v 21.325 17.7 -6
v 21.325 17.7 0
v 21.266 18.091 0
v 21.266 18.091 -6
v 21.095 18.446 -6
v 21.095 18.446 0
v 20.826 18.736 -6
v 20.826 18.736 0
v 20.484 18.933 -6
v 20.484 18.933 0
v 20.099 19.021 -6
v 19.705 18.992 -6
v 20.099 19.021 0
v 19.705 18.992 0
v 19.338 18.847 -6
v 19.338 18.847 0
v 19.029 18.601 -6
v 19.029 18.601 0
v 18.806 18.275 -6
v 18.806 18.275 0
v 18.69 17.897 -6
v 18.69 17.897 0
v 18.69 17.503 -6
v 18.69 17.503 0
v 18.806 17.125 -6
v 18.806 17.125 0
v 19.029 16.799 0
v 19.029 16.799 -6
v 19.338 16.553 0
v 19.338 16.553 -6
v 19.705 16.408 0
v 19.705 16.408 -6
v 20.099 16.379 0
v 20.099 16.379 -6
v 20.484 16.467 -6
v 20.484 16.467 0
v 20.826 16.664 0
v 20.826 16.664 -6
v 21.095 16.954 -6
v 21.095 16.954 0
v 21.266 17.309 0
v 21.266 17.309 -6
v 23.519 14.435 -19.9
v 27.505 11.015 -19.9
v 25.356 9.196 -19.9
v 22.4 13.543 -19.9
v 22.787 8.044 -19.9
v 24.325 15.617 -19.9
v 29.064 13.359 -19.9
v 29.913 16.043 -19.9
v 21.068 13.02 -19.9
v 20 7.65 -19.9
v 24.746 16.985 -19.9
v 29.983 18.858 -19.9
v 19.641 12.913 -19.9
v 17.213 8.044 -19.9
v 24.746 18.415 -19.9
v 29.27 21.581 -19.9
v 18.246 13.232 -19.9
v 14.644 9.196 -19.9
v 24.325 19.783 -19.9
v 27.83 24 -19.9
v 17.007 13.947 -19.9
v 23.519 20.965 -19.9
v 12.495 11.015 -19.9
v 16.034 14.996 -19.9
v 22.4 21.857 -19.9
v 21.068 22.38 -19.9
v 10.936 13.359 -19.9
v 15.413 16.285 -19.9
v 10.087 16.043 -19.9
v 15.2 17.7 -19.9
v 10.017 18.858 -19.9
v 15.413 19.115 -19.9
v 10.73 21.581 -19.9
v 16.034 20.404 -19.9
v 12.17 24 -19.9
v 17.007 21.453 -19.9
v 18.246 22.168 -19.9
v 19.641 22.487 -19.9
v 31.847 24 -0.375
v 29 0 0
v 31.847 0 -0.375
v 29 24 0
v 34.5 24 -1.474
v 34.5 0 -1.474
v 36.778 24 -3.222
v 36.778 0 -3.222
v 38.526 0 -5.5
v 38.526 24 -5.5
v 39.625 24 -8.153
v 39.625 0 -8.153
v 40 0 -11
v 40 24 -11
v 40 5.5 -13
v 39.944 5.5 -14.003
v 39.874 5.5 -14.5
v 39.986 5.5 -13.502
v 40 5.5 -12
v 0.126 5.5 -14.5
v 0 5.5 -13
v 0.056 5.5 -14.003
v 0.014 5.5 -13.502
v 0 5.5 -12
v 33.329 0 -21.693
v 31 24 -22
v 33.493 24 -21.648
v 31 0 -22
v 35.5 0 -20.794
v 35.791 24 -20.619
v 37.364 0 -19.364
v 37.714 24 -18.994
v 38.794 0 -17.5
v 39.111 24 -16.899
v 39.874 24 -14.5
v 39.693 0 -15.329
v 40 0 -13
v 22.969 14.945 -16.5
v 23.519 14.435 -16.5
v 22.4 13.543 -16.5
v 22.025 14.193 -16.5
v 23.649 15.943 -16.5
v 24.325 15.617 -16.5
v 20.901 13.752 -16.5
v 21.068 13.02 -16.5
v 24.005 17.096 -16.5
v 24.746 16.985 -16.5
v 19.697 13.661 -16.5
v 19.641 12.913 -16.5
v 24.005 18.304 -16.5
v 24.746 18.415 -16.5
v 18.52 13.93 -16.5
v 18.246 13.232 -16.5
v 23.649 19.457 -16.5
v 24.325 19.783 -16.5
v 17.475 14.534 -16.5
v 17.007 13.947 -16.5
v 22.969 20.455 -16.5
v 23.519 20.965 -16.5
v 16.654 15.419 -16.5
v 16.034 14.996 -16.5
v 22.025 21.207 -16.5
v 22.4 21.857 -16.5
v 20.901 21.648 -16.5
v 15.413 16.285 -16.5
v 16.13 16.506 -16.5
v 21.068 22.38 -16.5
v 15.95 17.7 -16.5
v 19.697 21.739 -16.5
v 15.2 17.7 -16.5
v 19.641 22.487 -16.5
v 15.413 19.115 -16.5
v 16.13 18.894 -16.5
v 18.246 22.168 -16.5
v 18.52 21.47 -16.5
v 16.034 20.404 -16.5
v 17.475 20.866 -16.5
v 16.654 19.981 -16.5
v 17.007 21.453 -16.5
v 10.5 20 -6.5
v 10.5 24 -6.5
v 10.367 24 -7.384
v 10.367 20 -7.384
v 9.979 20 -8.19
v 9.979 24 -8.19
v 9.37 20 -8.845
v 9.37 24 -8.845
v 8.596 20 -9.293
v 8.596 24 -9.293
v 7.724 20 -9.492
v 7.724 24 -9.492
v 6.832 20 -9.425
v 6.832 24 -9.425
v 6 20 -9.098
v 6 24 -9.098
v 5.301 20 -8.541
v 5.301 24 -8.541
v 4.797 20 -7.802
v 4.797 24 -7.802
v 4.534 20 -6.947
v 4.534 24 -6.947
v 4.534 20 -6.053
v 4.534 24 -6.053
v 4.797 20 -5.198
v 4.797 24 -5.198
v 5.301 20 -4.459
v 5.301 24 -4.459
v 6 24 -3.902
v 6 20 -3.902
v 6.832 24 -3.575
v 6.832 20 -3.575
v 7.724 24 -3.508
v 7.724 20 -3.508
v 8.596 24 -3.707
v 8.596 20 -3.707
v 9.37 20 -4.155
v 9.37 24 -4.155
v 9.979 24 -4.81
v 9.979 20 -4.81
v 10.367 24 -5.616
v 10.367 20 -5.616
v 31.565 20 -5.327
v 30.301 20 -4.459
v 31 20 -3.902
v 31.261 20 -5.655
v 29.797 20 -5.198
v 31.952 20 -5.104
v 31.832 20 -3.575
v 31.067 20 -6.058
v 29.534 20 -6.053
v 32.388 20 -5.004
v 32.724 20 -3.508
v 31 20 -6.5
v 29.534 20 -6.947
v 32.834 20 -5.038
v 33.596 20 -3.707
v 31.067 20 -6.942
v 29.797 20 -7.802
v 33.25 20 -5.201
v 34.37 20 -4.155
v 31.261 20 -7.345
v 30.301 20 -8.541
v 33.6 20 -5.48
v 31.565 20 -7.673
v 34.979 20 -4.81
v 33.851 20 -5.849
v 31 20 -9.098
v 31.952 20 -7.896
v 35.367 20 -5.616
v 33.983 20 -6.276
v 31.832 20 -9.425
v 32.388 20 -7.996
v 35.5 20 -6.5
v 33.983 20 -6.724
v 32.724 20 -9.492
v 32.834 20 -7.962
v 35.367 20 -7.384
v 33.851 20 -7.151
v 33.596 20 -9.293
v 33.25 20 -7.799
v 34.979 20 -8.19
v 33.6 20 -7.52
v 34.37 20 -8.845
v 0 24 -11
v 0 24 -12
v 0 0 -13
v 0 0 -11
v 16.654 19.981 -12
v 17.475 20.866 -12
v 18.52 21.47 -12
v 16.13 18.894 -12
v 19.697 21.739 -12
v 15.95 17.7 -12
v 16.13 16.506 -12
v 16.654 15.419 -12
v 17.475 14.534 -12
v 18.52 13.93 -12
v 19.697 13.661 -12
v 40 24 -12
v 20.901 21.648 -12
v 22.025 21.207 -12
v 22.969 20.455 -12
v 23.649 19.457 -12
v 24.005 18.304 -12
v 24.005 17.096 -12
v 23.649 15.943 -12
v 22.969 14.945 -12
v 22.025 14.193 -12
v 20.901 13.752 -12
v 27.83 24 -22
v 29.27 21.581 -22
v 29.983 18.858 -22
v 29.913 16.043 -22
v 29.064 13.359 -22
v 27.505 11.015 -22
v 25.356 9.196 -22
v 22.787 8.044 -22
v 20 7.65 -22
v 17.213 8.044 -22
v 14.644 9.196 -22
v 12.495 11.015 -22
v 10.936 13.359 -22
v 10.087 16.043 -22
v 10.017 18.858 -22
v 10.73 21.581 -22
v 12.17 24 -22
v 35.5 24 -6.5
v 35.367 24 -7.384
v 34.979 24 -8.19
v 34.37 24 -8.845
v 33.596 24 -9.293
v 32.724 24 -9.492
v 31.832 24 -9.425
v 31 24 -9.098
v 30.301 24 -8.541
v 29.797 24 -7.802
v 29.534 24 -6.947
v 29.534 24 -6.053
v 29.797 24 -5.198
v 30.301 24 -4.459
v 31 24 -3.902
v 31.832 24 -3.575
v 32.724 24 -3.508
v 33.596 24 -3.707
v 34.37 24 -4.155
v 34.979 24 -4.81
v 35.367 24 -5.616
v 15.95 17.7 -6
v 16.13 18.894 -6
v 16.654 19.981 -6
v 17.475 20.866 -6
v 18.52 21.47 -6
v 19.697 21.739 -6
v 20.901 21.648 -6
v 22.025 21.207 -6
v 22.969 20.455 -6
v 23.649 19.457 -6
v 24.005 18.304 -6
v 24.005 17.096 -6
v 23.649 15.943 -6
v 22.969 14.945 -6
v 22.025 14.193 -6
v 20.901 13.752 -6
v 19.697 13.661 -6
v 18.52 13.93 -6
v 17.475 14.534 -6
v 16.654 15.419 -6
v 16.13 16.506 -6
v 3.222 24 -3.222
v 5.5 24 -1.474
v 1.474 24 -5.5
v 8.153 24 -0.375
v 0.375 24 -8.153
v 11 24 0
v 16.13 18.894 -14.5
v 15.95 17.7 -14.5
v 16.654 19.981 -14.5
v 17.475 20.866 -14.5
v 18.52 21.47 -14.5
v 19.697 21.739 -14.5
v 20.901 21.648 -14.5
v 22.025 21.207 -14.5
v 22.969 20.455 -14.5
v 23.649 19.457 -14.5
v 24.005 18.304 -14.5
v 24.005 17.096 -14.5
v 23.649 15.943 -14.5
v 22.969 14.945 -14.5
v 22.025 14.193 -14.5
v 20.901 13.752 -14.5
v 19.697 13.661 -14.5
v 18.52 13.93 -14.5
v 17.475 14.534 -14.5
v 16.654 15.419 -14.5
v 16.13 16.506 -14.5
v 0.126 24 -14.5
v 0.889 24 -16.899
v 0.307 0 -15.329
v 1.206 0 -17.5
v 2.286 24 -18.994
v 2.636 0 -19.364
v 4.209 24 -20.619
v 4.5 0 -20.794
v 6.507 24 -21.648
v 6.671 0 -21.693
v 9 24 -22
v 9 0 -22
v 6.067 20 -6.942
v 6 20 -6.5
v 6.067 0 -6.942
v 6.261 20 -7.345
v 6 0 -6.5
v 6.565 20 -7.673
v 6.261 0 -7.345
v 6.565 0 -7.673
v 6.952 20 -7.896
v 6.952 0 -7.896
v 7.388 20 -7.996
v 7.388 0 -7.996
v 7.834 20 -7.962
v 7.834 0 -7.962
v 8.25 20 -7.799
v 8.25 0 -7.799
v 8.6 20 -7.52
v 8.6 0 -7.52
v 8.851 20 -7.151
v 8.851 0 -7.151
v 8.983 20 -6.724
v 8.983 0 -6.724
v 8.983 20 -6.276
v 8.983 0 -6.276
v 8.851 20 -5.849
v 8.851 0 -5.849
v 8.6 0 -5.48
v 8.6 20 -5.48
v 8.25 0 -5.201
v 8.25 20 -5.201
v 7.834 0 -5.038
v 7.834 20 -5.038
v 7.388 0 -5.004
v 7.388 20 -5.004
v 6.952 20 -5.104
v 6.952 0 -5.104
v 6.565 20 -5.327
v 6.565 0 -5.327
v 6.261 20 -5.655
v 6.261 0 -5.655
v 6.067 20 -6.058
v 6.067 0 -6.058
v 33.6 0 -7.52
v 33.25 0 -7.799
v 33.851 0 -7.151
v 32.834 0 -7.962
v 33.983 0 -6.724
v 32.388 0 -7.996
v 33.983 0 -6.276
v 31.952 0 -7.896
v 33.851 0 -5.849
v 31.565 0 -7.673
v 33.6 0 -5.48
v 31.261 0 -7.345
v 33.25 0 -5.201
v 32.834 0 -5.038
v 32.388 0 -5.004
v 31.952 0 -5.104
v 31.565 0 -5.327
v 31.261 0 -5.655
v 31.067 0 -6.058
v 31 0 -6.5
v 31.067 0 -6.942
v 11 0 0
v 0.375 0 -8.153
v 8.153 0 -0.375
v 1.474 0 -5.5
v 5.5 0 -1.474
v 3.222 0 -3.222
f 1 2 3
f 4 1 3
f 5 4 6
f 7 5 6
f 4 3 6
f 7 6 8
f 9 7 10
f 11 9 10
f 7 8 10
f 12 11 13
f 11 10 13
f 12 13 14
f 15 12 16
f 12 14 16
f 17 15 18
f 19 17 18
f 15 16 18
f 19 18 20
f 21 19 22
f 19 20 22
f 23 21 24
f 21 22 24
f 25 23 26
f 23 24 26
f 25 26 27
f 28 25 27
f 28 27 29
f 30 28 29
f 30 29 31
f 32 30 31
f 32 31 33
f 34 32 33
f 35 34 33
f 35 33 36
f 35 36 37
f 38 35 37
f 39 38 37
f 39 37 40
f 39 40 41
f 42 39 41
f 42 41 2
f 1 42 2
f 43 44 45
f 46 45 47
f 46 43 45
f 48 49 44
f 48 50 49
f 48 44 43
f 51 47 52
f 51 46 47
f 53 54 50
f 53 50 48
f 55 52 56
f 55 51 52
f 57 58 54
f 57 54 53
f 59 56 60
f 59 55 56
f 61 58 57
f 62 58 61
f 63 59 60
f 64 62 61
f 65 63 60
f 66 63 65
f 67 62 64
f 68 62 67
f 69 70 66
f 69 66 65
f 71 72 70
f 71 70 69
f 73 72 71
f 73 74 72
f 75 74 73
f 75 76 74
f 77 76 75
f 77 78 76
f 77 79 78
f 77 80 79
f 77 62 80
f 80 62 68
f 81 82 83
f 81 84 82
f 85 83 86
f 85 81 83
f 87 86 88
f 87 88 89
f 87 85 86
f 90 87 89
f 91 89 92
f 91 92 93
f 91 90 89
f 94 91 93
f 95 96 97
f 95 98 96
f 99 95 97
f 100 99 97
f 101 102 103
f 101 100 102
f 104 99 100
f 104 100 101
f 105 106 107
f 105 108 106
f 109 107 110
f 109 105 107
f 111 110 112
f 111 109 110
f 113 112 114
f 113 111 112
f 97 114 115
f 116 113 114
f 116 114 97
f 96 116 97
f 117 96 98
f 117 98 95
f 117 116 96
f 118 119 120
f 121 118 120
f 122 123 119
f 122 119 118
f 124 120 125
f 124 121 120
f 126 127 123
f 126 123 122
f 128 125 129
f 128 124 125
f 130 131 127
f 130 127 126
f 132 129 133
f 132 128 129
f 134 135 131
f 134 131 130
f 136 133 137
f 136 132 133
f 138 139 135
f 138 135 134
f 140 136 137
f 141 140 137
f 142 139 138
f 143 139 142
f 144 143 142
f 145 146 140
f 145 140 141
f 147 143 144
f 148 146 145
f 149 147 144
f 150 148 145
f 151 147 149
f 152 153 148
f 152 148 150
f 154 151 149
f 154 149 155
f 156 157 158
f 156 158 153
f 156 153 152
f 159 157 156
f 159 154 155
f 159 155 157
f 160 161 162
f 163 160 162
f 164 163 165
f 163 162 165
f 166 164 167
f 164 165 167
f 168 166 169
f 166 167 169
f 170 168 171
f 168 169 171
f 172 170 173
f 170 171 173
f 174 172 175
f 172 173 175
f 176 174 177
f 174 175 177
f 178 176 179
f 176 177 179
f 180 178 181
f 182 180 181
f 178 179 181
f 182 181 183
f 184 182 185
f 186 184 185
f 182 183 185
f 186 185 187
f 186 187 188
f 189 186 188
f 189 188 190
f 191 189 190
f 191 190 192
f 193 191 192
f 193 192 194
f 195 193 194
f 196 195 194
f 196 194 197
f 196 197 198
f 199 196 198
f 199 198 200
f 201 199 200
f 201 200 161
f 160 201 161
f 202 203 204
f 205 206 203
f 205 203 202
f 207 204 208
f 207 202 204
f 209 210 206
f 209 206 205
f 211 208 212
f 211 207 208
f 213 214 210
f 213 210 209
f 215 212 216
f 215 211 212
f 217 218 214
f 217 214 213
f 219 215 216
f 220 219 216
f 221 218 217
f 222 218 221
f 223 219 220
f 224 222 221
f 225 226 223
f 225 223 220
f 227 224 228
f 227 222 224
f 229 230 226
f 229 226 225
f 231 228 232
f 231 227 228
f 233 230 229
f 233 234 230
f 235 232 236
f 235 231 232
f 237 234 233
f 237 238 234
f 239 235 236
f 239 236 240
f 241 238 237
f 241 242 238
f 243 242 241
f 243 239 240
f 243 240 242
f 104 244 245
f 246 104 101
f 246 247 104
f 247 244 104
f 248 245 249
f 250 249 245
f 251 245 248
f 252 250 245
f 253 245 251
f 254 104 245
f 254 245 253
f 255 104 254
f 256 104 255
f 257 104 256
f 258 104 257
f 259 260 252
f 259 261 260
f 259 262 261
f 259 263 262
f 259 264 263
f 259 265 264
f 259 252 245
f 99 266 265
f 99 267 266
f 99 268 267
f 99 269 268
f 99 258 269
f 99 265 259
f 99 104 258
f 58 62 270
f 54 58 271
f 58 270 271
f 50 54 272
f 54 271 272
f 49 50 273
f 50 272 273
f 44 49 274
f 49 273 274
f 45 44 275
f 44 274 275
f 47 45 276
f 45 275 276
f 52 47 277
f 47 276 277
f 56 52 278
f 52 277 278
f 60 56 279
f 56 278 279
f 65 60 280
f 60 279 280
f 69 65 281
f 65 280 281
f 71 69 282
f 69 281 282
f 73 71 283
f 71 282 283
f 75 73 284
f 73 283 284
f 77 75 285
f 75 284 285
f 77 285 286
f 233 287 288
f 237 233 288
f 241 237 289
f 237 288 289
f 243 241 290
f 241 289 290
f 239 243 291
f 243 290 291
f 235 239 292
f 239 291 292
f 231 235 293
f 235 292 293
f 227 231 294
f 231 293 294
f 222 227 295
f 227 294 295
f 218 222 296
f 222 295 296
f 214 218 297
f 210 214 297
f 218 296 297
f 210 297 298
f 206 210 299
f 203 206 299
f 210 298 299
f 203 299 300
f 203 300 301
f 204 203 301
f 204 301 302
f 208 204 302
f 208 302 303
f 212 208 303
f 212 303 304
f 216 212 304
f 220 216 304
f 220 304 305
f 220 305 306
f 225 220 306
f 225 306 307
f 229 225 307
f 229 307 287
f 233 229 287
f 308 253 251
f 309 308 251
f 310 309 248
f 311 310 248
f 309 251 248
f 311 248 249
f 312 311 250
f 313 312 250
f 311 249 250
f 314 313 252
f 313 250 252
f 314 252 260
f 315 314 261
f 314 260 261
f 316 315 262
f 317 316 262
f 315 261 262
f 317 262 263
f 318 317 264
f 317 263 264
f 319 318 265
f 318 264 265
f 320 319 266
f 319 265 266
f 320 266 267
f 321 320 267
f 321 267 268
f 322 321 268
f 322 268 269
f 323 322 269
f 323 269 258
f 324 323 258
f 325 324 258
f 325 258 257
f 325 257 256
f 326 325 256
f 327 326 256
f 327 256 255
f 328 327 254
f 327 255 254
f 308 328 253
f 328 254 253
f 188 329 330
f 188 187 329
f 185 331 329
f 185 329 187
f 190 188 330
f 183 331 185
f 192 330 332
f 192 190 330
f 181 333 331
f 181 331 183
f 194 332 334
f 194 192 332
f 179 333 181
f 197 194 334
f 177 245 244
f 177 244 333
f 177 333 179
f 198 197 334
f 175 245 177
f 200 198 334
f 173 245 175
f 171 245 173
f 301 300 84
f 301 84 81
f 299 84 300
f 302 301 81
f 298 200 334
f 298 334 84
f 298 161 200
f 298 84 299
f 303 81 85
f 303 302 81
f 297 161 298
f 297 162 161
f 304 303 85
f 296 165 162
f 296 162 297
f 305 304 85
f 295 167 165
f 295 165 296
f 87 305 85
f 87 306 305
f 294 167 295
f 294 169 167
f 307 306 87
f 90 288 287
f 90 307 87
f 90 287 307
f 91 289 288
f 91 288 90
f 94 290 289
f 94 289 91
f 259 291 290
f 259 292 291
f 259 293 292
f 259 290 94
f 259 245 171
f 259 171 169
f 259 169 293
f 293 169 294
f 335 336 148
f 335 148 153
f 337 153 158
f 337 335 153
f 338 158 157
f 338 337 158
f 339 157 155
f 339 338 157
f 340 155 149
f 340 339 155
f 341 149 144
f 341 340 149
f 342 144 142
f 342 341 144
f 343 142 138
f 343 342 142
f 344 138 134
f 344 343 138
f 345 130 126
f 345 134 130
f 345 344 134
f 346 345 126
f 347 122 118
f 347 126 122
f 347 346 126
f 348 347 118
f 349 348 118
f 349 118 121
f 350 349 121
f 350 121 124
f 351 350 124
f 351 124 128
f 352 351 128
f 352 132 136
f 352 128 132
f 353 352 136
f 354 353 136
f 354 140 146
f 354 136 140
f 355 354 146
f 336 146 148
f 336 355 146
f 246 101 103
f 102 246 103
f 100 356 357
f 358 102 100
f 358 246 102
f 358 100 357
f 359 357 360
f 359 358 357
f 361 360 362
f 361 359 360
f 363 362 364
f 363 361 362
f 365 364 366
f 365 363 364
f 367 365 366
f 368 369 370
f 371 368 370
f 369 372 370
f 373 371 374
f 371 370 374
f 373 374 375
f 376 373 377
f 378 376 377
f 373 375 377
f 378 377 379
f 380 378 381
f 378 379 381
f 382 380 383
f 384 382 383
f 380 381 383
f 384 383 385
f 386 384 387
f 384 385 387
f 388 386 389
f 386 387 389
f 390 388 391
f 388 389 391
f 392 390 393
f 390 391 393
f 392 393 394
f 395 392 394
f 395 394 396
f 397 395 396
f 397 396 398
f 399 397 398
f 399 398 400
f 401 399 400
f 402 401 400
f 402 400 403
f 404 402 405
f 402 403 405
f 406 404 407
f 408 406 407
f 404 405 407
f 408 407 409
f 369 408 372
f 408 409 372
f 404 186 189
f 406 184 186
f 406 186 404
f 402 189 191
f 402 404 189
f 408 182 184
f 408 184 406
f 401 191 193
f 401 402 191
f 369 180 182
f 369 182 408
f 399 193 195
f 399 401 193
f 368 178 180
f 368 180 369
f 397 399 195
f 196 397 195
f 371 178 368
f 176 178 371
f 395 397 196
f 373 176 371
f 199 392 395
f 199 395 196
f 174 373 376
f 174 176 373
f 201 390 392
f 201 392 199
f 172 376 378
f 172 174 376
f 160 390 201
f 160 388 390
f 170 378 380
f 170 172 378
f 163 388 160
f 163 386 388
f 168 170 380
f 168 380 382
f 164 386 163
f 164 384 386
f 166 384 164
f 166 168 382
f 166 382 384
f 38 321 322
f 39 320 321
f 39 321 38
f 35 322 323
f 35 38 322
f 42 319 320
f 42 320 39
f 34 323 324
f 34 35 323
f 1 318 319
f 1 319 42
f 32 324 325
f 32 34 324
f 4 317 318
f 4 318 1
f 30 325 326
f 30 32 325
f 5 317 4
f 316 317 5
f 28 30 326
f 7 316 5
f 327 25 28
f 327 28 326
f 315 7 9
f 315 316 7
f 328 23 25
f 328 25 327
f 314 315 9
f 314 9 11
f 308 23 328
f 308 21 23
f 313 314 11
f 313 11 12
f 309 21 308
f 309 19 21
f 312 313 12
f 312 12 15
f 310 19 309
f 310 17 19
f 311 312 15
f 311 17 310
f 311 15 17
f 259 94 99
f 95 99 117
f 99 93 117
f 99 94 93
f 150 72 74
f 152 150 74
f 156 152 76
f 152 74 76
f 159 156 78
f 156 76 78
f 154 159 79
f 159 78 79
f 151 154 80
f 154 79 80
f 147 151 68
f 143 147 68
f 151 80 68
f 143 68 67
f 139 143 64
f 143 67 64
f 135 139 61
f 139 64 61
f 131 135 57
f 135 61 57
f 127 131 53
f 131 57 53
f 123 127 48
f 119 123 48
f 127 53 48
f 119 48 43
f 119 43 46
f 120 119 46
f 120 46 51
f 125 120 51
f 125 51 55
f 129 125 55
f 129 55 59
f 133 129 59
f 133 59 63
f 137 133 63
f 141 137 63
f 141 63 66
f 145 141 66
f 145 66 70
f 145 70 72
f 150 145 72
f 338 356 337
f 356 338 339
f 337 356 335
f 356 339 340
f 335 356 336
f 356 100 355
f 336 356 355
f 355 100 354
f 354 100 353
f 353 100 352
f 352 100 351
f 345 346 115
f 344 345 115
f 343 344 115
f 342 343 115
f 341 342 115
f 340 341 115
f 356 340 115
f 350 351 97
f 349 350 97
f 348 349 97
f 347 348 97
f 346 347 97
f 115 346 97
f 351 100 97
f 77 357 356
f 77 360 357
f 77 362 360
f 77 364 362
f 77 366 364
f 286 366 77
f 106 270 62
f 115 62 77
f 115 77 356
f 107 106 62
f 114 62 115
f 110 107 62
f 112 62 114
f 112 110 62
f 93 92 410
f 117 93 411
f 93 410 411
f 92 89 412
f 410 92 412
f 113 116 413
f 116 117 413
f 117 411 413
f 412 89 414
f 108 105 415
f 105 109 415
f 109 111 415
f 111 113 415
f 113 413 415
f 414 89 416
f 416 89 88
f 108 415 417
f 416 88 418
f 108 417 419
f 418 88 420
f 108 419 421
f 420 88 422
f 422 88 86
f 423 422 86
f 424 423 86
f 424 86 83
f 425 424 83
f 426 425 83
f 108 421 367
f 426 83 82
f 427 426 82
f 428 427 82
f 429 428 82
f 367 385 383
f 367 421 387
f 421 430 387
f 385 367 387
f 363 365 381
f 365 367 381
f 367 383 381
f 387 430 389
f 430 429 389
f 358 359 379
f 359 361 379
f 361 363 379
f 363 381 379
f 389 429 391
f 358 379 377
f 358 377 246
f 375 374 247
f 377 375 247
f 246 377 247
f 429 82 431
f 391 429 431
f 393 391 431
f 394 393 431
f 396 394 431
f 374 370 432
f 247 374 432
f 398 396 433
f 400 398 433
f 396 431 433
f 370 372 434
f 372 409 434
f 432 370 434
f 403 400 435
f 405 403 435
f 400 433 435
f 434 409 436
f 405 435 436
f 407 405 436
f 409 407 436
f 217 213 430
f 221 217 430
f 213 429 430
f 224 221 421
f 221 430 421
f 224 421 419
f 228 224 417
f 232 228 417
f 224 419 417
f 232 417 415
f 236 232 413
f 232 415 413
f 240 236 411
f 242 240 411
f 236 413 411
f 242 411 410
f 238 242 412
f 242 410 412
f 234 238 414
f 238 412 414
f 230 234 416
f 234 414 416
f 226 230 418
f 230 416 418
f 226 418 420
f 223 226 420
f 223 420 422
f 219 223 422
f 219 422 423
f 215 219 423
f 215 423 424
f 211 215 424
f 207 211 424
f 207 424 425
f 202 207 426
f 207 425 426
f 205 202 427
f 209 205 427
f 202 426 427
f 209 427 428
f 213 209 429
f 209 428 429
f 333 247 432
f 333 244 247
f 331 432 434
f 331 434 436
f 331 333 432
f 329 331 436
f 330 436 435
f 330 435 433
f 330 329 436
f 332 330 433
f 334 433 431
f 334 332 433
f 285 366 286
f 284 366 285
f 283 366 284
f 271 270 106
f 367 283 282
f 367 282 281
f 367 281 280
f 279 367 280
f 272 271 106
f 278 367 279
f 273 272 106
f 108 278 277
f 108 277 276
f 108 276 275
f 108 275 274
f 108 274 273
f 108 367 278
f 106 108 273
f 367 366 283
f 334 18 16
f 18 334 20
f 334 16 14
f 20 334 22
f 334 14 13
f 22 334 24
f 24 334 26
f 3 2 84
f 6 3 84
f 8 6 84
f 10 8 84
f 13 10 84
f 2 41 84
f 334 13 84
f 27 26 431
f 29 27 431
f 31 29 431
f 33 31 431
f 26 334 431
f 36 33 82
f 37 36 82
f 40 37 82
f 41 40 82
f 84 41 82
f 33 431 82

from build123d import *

# Parameters (mm, degrees)
SKETCH2_W                                          = 40
SKETCH2_H                                          = 12
BOSS_EXTRUDE1_DEPTH                                = 24
CBORE_FOR_M2_5_HEX_HEAD_MACHINE_SCREW1_D           = 3
CBORE_FOR_M2_5_HEX_HEAD_MACHINE_SCREW1_DEPTH       = 38.1
CBORE_FOR_M2_5_HEX_HEAD_MACHINE_SCREW1_CBORE_D     = 6
CBORE_FOR_M2_5_HEX_HEAD_MACHINE_SCREW1_CBORE_DEPTH = 4
CBORE_FOR_M2_5_HEX_HEAD_MACHINE_SCREW1_TIP         = 0.901290929
SKETCH11_W                                         = 40
SKETCH11_H                                         = 5.5
BOSS_EXTRUDE2_DEPTH                                = 10
SKETCH12_W                                         = 40
SKETCH12_H                                         = 7.5
BOSS_EXTRUDE3_DEPTH                                = 18.5
SKETCH10_R                                         = 4.05
CUT_EXTRUDE1_DEPTH                                 = 17
CUT_EXTRUDE1_DEPTH_BACK                            = 6
SKETCH13_R                                         = 4.8
CUT_EXTRUDE2_DEPTH                                 = 5.5
SKETCH14_R                                         = 10.05
CUT_EXTRUDE3_DEPTH                                 = 2.1
TAP_DRILL_FOR_M2_5_HELICOIL1_D                     = 2.65
FILLET1_R                                          = 11
FILLET2_R                                          = 9


with BuildPart() as part:
    # Sketch2 → Boss-Extrude1 (new body)
    with BuildSketch(Plane(origin=(0, 0, 0), x_dir=(1, 0, 0), z_dir=(0, 1, 0))):
        with Locations((20, 6)):
            Rectangle(SKETCH2_W, SKETCH2_H)
    extrude(amount=BOSS_EXTRUDE1_DEPTH)

    # CBORE for M2.5 Hex Head Machine Screw1
    with Locations(Plane(origin=(0, 24, 0), x_dir=(1, 0, 0), z_dir=(0, 1, 0))):
        with Locations((7.5, 6.5), (32.5, 6.5)):
            CounterBoreHole(CBORE_FOR_M2_5_HEX_HEAD_MACHINE_SCREW1_D / 2, CBORE_FOR_M2_5_HEX_HEAD_MACHINE_SCREW1_CBORE_D / 2, CBORE_FOR_M2_5_HEX_HEAD_MACHINE_SCREW1_CBORE_DEPTH, depth=CBORE_FOR_M2_5_HEX_HEAD_MACHINE_SCREW1_DEPTH)
            with Locations((0, 0, -(CBORE_FOR_M2_5_HEX_HEAD_MACHINE_SCREW1_DEPTH + CBORE_FOR_M2_5_HEX_HEAD_MACHINE_SCREW1_TIP / 2))):  # 118° drill point
                Cone(0, CBORE_FOR_M2_5_HEX_HEAD_MACHINE_SCREW1_D / 2, CBORE_FOR_M2_5_HEX_HEAD_MACHINE_SCREW1_TIP, mode=Mode.SUBTRACT)

    # Sketch11 → Boss-Extrude2 (add)
    with BuildSketch(Plane(origin=(0, 0, -12), x_dir=(-1, 0, 0), z_dir=(0, 0, -1))):
        with Locations((-20, 2.75)):
            Rectangle(SKETCH11_W, SKETCH11_H)
    extrude(amount=BOSS_EXTRUDE2_DEPTH)

    # Sketch12 → Boss-Extrude3 (add)
    with BuildSketch(Plane(origin=(0, 5.5, 0), x_dir=(1, 0, 0), z_dir=(0, 1, 0))):
        with Locations((20, 18.25)):
            Rectangle(SKETCH12_W, SKETCH12_H)
    extrude(amount=BOSS_EXTRUDE3_DEPTH)

    # Sketch10 → Cut-Extrude1 (cut, two sides)
    with BuildSketch(Plane(origin=(0, 0, -12), x_dir=(-1, 0, 0), z_dir=(0, 0, -1))) as cut_extrude1_sk:
        with Locations((-20, 17.7)):
            Circle(SKETCH10_R)
    extrude(amount=CUT_EXTRUDE1_DEPTH, mode=Mode.SUBTRACT)
    extrude(cut_extrude1_sk.sketch, amount=-CUT_EXTRUDE1_DEPTH_BACK, mode=Mode.SUBTRACT)

    # Sketch13 → Cut-Extrude2 (cut)
    with BuildSketch(Plane(origin=(0, 0, -22), x_dir=(-1, 0, 0), z_dir=(0, 0, -1))):
        with Locations((-20, 17.7)):
            Circle(SKETCH13_R)
    extrude(amount=-CUT_EXTRUDE2_DEPTH, mode=Mode.SUBTRACT)

    # Sketch14 → Cut-Extrude3 (cut)
    with BuildSketch(Plane(origin=(0, 0, -22), x_dir=(-1, 0, 0), z_dir=(0, 0, -1))):
        with Locations((-20, 17.7)):
            Circle(SKETCH14_R)
    extrude(amount=-CUT_EXTRUDE3_DEPTH, mode=Mode.SUBTRACT)

    # Tap Drill for M2.5 Helicoil1 (through all)
    with Locations(Plane(origin=(0, 0, -6), x_dir=(-1, 0, 0), z_dir=(0, 0, -1))):
        with Locations((-20, 17.7)):
            Hole(TAP_DRILL_FOR_M2_5_HELICOIL1_D / 2)

    # Fillet1
    fillet1_edges = [part.edges().sort_by_distance(p)[0] for p in [
        (40, 12, 0),
        (0, 12, 0),
    ]]
    fillet(fillet1_edges, radius=FILLET1_R)

    # Fillet2
    fillet2_edges = [part.edges().sort_by_distance(p)[0] for p in [
        (0, 12, -22),
        (40, 12, -22),
    ]]
    fillet(fillet2_edges, radius=FILLET2_R)


solid = part.part
